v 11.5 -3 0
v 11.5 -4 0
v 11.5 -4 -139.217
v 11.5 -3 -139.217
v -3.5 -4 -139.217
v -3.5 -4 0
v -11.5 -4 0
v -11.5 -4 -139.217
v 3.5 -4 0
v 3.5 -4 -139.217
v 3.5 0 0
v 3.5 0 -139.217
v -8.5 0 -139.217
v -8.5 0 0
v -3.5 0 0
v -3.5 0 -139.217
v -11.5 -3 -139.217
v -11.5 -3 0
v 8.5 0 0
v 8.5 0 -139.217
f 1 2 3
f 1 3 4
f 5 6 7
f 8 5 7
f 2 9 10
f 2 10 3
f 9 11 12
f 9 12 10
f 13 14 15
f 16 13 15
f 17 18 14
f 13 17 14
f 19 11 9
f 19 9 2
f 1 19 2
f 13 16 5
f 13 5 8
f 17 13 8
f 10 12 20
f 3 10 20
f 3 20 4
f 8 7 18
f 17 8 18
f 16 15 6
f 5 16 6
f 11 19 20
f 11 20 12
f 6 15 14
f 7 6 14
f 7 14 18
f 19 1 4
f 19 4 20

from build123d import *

# Parameters (mm, degrees)
BOSS_EXTRUDE1_DEPTH   = 139.217420787
BOSS_EXTRUDE1_2_DEPTH = 139.217420787


with BuildPart() as part:
    # Sketch1 → Boss-Extrude1 (new body)
    with BuildSketch(Plane.XY):
        Polygon((-3.5, 0), (-3.5, -4), (-11.5, -4), (-11.5, -3), (-8.5, 0), align=None)
    extrude(amount=-BOSS_EXTRUDE1_DEPTH)


with BuildPart() as body_2:
    # Sketch1 → Boss-Extrude1 2 (new body)
    with BuildSketch(Plane.XY):
        Polygon((11.5, -4), (11.5, -3), (8.5, 0), (3.5, 0), (3.5, -4), align=None)
    extrude(amount=-BOSS_EXTRUDE1_2_DEPTH)


solid = Compound([part.part, body_2.part])
